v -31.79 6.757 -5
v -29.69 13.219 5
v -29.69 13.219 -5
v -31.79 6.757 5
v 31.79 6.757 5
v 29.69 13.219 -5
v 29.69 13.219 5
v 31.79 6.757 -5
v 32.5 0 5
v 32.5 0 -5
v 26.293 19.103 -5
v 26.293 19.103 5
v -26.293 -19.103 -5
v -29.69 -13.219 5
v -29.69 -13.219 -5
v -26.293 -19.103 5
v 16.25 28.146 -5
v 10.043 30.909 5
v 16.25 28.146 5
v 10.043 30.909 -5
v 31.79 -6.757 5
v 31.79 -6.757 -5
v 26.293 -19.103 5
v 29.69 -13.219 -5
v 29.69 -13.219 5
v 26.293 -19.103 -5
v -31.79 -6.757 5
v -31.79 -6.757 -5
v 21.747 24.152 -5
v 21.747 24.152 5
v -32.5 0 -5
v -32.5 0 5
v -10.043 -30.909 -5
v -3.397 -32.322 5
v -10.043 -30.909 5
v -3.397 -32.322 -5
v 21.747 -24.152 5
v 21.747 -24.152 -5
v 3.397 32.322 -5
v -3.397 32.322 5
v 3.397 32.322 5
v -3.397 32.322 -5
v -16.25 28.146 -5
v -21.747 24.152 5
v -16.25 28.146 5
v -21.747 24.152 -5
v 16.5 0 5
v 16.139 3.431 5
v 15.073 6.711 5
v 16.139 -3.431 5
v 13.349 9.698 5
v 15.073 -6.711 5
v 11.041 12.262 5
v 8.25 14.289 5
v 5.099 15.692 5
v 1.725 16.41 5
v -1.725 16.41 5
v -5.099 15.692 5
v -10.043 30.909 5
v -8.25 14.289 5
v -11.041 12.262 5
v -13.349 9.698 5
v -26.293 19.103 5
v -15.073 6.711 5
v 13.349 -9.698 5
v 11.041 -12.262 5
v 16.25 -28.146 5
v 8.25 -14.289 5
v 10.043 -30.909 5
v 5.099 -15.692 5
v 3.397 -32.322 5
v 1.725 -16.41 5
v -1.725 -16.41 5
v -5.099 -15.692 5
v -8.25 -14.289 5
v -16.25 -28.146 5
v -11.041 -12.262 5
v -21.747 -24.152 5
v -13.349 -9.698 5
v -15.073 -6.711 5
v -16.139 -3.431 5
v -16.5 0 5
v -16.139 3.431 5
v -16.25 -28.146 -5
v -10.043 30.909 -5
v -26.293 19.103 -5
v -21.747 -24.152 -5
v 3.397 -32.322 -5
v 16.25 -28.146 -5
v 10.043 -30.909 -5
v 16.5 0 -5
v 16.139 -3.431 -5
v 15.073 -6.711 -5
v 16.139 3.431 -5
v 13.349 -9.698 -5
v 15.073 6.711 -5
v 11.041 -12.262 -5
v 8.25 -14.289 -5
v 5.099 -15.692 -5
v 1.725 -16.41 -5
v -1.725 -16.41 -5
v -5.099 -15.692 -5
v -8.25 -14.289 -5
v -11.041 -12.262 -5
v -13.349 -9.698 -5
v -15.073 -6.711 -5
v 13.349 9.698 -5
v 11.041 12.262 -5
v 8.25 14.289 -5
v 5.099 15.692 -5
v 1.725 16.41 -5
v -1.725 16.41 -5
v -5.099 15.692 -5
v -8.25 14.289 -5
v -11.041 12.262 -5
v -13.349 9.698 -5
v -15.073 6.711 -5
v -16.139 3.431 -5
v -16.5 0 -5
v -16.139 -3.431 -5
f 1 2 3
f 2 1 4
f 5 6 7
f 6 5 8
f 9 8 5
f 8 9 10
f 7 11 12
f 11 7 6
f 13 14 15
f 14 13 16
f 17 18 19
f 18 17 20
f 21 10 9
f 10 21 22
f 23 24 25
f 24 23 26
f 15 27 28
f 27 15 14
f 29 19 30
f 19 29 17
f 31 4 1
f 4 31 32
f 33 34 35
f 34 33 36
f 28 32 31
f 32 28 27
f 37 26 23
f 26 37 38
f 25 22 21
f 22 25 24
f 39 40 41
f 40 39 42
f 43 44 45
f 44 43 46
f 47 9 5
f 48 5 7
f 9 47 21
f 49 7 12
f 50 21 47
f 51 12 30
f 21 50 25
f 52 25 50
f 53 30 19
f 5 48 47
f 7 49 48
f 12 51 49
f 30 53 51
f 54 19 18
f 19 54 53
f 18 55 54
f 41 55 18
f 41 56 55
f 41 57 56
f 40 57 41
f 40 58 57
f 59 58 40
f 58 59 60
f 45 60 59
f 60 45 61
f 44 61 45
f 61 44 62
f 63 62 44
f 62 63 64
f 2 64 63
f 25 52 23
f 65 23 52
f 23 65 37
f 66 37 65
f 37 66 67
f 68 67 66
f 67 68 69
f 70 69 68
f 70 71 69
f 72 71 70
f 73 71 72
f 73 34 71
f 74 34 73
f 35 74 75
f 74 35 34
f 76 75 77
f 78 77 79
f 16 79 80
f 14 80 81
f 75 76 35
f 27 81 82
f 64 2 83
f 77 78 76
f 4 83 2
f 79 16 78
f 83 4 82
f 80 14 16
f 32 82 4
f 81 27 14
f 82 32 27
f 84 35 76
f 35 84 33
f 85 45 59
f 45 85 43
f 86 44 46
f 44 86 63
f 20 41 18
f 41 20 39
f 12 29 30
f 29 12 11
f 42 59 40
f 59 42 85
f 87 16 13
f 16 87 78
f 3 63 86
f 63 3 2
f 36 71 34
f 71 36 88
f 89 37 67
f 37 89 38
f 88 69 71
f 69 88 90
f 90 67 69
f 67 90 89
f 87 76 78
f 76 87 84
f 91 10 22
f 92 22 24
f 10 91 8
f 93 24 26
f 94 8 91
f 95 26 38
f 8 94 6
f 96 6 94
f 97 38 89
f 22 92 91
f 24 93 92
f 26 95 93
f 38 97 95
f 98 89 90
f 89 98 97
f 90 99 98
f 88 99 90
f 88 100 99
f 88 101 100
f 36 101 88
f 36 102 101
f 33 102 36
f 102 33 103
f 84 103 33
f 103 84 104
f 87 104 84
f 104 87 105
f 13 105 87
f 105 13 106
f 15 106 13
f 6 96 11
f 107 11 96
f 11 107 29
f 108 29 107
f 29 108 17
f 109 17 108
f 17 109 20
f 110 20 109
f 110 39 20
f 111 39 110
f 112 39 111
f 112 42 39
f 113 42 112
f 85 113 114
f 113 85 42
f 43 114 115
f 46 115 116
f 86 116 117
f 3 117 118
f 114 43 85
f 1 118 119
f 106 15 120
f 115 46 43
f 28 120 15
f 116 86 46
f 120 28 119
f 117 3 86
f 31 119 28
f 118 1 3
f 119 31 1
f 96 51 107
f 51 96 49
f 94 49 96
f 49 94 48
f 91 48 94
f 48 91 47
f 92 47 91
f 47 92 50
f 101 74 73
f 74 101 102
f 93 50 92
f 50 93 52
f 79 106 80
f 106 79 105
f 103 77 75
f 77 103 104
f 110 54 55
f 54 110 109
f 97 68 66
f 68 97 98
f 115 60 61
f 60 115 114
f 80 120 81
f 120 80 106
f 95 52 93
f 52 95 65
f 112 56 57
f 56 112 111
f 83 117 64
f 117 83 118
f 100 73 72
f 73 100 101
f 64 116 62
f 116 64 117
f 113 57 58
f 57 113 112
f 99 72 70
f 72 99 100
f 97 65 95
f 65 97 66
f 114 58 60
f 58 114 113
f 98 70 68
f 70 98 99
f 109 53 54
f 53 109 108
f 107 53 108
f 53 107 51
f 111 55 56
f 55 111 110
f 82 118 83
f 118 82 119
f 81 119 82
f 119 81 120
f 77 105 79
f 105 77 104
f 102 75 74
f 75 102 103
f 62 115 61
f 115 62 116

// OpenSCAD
//resolutuion. Minimum angle for a fragment
 $fa=12;
 
// Minimum size of a fragment.
 $fs=2;

// Make either thread or hole
threads = 0; 

// Thread in both ends
both_ends = 0;

// How much space should be added to the hole/threads
thread_tolerance = 0.1;

// Metric tread outer diameter
top_thread_diameter = 8;

// Distance between peaks
top_thread_pitch = 1.25;

// How deep the thread goes
top_thread_depth = 4;

// Metric tread outer diameter
bottom_thread_diameter = 10;

// Distance between peaks
bottom_thread_pitch = 1.5;

// How deep the thread goes
bottom_thread_depth = 4;

// Inner Diameter
id = 33;

// Outer Diameter
od = 65;

//Length of the spacer
length = 10;


difference() {
    //Makes od cylinder
    cylinder(d=od, h=length, center=true);
    
    //Makes id if threads is false
    if  (threads<1)
        cylinder(d=id, h=length + 5, center=true);
    
    else 
        // Makes bottom thread
        translate([0,0,-length / 2])
        metric_thread(top_thread_diameter, top_thread_pitch + thread_tolerance, top_thread_depth, internal=true);
    
        // Makes top thread if needed
        if ((both_ends>0)&&(top_thread_depth+bottom_thread_depth<length))
            translate([0,0,length / 2 - bottom_thread_depth])
        metric_thread(bottom_thread_diameter + thread_tolerance, bottom_thread_pitch, bottom_thread_depth, internal=true);
}



/*
 * ISO-standard metric threads, following this specification:
 *          http://en.wikipedia.org/wiki/ISO_metric_screw_thread
 *
 * Copyright 2020 Dan Kirshner - dan_kirshner@yahoo.com
 * This program is free software: you can redistribute it and/or modify
 * it under the terms of the GNU General Public License as published by
 * the Free Software Foundation, either version 3 of the License, or
 * (at your option) any later version.
 *
 * This program is distributed in the hope that it will be useful,
 * but WITHOUT ANY WARRANTY; without even the implied warranty of
 * MERCHANTABILITY or FITNESS FOR A PARTICULAR PURPOSE.  See the
 * GNU General Public License for more details.
 *
 * See <http://www.gnu.org/licenses/>.
 *
 * Version 2.5.  2020-04-11  Leadin option works for internal threads.
 * Version 2.4.  2019-07-14  Add test option - do not render threads.
 * Version 2.3.  2017-08-31  Default for leadin: 0 (best for internal threads).
 * Version 2.2.  2017-01-01  Correction for angle; leadfac option.  (Thanks to
 *                           Andrew Allen <a2intl@gmail.com>.)
 * Version 2.1.  2016-12-04  Chamfer bottom end (low-z); leadin option.
 * Version 2.0.  2016-11-05  Backwards compatibility (earlier OpenSCAD) fixes.
 * Version 1.9.  2016-07-03  Option: tapered.
 * Version 1.8.  2016-01-08  Option: (non-standard) angle.
 * Version 1.7.  2015-11-28  Larger x-increment - for small-diameters.
 * Version 1.6.  2015-09-01  Options: square threads, rectangular threads.
 * Version 1.5.  2015-06-12  Options: thread_size, groove.
 * Version 1.4.  2014-10-17  Use "faces" instead of "triangles" for polyhedron
 * Version 1.3.  2013-12-01  Correct loop over turns -- don't have early cut-off
 * Version 1.2.  2012-09-09  Use discrete polyhedra rather than linear_extrude ()
 * Version 1.1.  2012-09-07  Corrected to right-hand threads!
 */

// Examples.
//
// Standard M8 x 1.
// metric_thread (diameter=8, pitch=1, length=4);

// Square thread.
// metric_thread (diameter=8, pitch=1, length=4, square=true);

// Non-standard: long pitch, same thread size.
//metric_thread (diameter=8, pitch=4, length=4, thread_size=1, groove=true);

// Non-standard: 20 mm diameter, long pitch, square "trough" width 3 mm,
// depth 1 mm.
//metric_thread (diameter=20, pitch=8, length=16, square=true, thread_size=6,
//               groove=true, rectangle=0.333);

// English: 1/4 x 20.
//english_thread (diameter=1/4, threads_per_inch=20, length=1);

// Tapered.  Example -- pipe size 3/4" -- per:
// http://www.engineeringtoolbox.com/npt-national-pipe-taper-threads-d_750.html
// english_thread (diameter=1.05, threads_per_inch=14, length=3/4, taper=1/16);

// Thread for mounting on Rohloff hub.
//difference () {
//   cylinder (r=20, h=10, $fn=100);
//
//   metric_thread (diameter=34, pitch=1, length=10, internal=true, n_starts=6);
//}


// ----------------------------------------------------------------------------
function segments (diameter) = min (50, max (ceil (diameter*6), 25));


// ----------------------------------------------------------------------------
// diameter -    outside diameter of threads in mm. Default: 8.
// pitch    -    thread axial "travel" per turn in mm.  Default: 1.
// length   -    overall axial length of thread in mm.  Default: 1.
// internal -    true = clearances for internal thread (e.g., a nut).
//               false = clearances for external thread (e.g., a bolt).
//               (Internal threads should be "cut out" from a solid using
//               difference ()).  Default: false.
// n_starts -    Number of thread starts (e.g., DNA, a "double helix," has
//               n_starts=2).  See wikipedia Screw_thread.  Default: 1.
// thread_size - (non-standard) axial width of a single thread "V" - independent
//               of pitch.  Default: same as pitch.
// groove      - (non-standard) true = subtract inverted "V" from cylinder
//                (rather thanadd protruding "V" to cylinder).  Default: false.
// square      - true = square threads (per
//               https://en.wikipedia.org/wiki/Square_thread_form).  Default:
//               false.
// rectangle   - (non-standard) "Rectangular" thread - ratio depth/(axial) width
//               Default: 0 (standard "v" thread).
// angle       - (non-standard) angle (deg) of thread side from perpendicular to
//               axis (default = standard = 30 degrees).
// taper       - diameter change per length (National Pipe Thread/ANSI B1.20.1
//               is 1" diameter per 16" length). Taper decreases from 'diameter'
//               as z increases.  Default: 0 (no taper).
// leadin      - 0 (default): no chamfer; 1: chamfer (45 degree) at max-z end;
//               2: chamfer at both ends, 3: chamfer at z=0 end.
// leadfac     - scale of leadin chamfer length (default: 1.0 = 1/2 thread).
// test        - true = do not render threads (just draw "blank" cylinder).
//               Default: false (draw threads).
module metric_thread (diameter=8, pitch=1, length=1, internal=false, n_starts=1,
                      thread_size=-1, groove=false, square=false, rectangle=0,
                      angle=30, taper=0, leadin=0, leadfac=1.0, test=false)
{
   // thread_size: size of thread "V" different than travel per turn (pitch).
   // Default: same as pitch.
   local_thread_size = thread_size == -1 ? pitch : thread_size;
   local_rectangle = rectangle ? rectangle : 1;

   n_segments = segments (diameter);
   h = (test && ! internal) ? 0 : (square || rectangle) ? local_thread_size*local_rectangle/2 : local_thread_size / (2 * tan(angle));

   h_fac1 = (square || rectangle) ? 0.90 : 0.625;

   // External thread includes additional relief.
   h_fac2 = (square || rectangle) ? 0.95 : 5.3/8;

   tapered_diameter = diameter - length*taper;

   difference () {
      union () {
         if (! groove) {
            if (! test) {
               metric_thread_turns (diameter, pitch, length, internal, n_starts,
                                    local_thread_size, groove, square, rectangle, angle,
                                    taper);
            }
         }

         difference () {

            // Solid center, including Dmin truncation.
            if (groove) {
               cylinder (r1=diameter/2, r2=tapered_diameter/2,
                         h=length, $fn=n_segments);
            } else if (internal) {
               cylinder (r1=diameter/2 - h*h_fac1, r2=tapered_diameter/2 - h*h_fac1,
                         h=length, $fn=n_segments);
            } else {

               // External thread.
               cylinder (r1=diameter/2 - h*h_fac2, r2=tapered_diameter/2 - h*h_fac2,
                         h=length, $fn=n_segments);
            }

            if (groove) {
               if (! test) {
                  metric_thread_turns (diameter, pitch, length, internal, n_starts,
                                       local_thread_size, groove, square, rectangle,
                                       angle, taper);
               }
            }
         }

         // Internal thread lead-in: take away from external solid.
         if (internal) {

            // "Negative chamfer" z=0 end if leadin is 2 or 3.
            if (leadin == 2 || leadin == 3) {
               cylinder (r1=diameter/2, r2=diameter/2 - h*h_fac1*leadfac, h=h*h_fac1*leadfac,
                         $fn=n_segments);
            }

            // "Negative chamfer" z-max end if leadin is 1 or 2.
            if (leadin == 1 || leadin == 2) {
               translate ([0, 0, length + 0.05 - h*h_fac1*leadfac]) {
                  cylinder (r1=tapered_diameter/2 - h*h_fac1*leadfac, h=h*h_fac1*leadfac,
                            r2=tapered_diameter/2,
                            $fn=n_segments);
               }
            }
         }
      }

      if (! internal) {

         // Chamfer z=0 end if leadin is 2 or 3.
         if (leadin == 2 || leadin == 3) {
            difference () {
               cylinder (r=diameter/2 + 1, h=h*h_fac1*leadfac, $fn=n_segments);

               cylinder (r2=diameter/2, r1=diameter/2 - h*h_fac1*leadfac, h=h*h_fac1*leadfac,
                         $fn=n_segments);
            }
         }

         // Chamfer z-max end if leadin is 1 or 2.
         if (leadin == 1 || leadin == 2) {
            translate ([0, 0, length + 0.05 - h*h_fac1*leadfac]) {
               difference () {
                  cylinder (r=diameter/2 + 1, h=h*h_fac1*leadfac, $fn=n_segments);

                  cylinder (r1=tapered_diameter/2, r2=tapered_diameter/2 - h*h_fac1*leadfac, h=h*h_fac1*leadfac,
                            $fn=n_segments);
               }
            }
         }
      }
   }
}


// ----------------------------------------------------------------------------
// Input units in inches.
// Note: units of measure in drawing are mm!
module english_thread (diameter=0.25, threads_per_inch=20, length=1,
                      internal=false, n_starts=1, thread_size=-1, groove=false,
                      square=false, rectangle=0, angle=30, taper=0, leadin=0,
                      leadfac=1.0, test=false)
{
   // Convert to mm.
   mm_diameter = diameter*25.4;
   mm_pitch = (1.0/threads_per_inch)*25.4;
   mm_length = length*25.4;

   echo (str ("mm_diameter: ", mm_diameter));
   echo (str ("mm_pitch: ", mm_pitch));
   echo (str ("mm_length: ", mm_length));
   metric_thread (mm_diameter, mm_pitch, mm_length, internal, n_starts,
                  thread_size, groove, square, rectangle, angle, taper, leadin,
                  leadfac, test);
}

// ----------------------------------------------------------------------------
module metric_thread_turns (diameter, pitch, length, internal, n_starts,
                            thread_size, groove, square, rectangle, angle,
                            taper)
{
   // Number of turns needed.
   n_turns = floor (length/pitch);

   intersection () {

      // Start one below z = 0.  Gives an extra turn at each end.
      for (i=[-1*n_starts : n_turns+1]) {
         translate ([0, 0, i*pitch]) {
            metric_thread_turn (diameter, pitch, internal, n_starts,
                                thread_size, groove, square, rectangle, angle,
                                taper, i*pitch);
         }
      }

      // Cut to length.
      translate ([0, 0, length/2]) {
         cube ([diameter*3, diameter*3, length], center=true);
      }
   }
}


// ----------------------------------------------------------------------------
module metric_thread_turn (diameter, pitch, internal, n_starts, thread_size,
                           groove, square, rectangle, angle, taper, z)
{
   n_segments = segments (diameter);
   fraction_circle = 1.0/n_segments;
   for (i=[0 : n_segments-1]) {
      rotate ([0, 0, i*360*fraction_circle]) {
         translate ([0, 0, i*n_starts*pitch*fraction_circle]) {
            //current_diameter = diameter - taper*(z + i*n_starts*pitch*fraction_circle);
            thread_polyhedron ((diameter - taper*(z + i*n_starts*pitch*fraction_circle))/2,
                               pitch, internal, n_starts, thread_size, groove,
                               square, rectangle, angle);
         }
      }
   }
}


// ----------------------------------------------------------------------------
module thread_polyhedron (radius, pitch, internal, n_starts, thread_size,
                          groove, square, rectangle, angle)
{
   n_segments = segments (radius*2);
   fraction_circle = 1.0/n_segments;

   local_rectangle = rectangle ? rectangle : 1;

   h = (square || rectangle) ? thread_size*local_rectangle/2 : thread_size / (2 * tan(angle));
   outer_r = radius + (internal ? h/20 : 0); // Adds internal relief.
   //echo (str ("outer_r: ", outer_r));

   // A little extra on square thread -- make sure overlaps cylinder.
   h_fac1 = (square || rectangle) ? 1.1 : 0.875;
   inner_r = radius - h*h_fac1; // Does NOT do Dmin_truncation - do later with
                                // cylinder.

   translate_y = groove ? outer_r + inner_r : 0;
   reflect_x   = groove ? 1 : 0;

   // Make these just slightly bigger (keep in proportion) so polyhedra will
   // overlap.
   x_incr_outer = (! groove ? outer_r : inner_r) * fraction_circle * 2 * PI * 1.02;
   x_incr_inner = (! groove ? inner_r : outer_r) * fraction_circle * 2 * PI * 1.02;
   z_incr = n_starts * pitch * fraction_circle * 1.005;

   /*
    (angles x0 and x3 inner are actually 60 deg)

                          /\  (x2_inner, z2_inner) [2]
                         /  \
   (x3_inner, z3_inner) /    \
                  [3]   \     \
                        |\     \ (x2_outer, z2_outer) [6]
                        | \    /
                        |  \  /|
             z          |[7]\/ / (x1_outer, z1_outer) [5]
             |          |   | /
             |   x      |   |/
             |  /       |   / (x0_outer, z0_outer) [4]
             | /        |  /     (behind: (x1_inner, z1_inner) [1]
             |/         | /
    y________|          |/
   (r)                  / (x0_inner, z0_inner) [0]

   */

   x1_outer = outer_r * fraction_circle * 2 * PI;

   z0_outer = (outer_r - inner_r) * tan(angle);
   //echo (str ("z0_outer: ", z0_outer));

   //polygon ([[inner_r, 0], [outer_r, z0_outer],
   //        [outer_r, 0.5*pitch], [inner_r, 0.5*pitch]]);
   z1_outer = z0_outer + z_incr;

   // Give internal square threads some clearance in the z direction, too.
   bottom = internal ? 0.235 : 0.25;
   top    = internal ? 0.765 : 0.75;

   translate ([0, translate_y, 0]) {
      mirror ([reflect_x, 0, 0]) {

         if (square || rectangle) {

            // Rule for face ordering: look at polyhedron from outside: points must
            // be in clockwise order.
            polyhedron (
               points = [
                         [-x_incr_inner/2, -inner_r, bottom*thread_size],         // [0]
                         [x_incr_inner/2, -inner_r, bottom*thread_size + z_incr], // [1]
                         [x_incr_inner/2, -inner_r, top*thread_size + z_incr],    // [2]
                         [-x_incr_inner/2, -inner_r, top*thread_size],            // [3]

                         [-x_incr_outer/2, -outer_r, bottom*thread_size],         // [4]
                         [x_incr_outer/2, -outer_r, bottom*thread_size + z_incr], // [5]
                         [x_incr_outer/2, -outer_r, top*thread_size + z_incr],    // [6]
                         [-x_incr_outer/2, -outer_r, top*thread_size]             // [7]
                        ],

               faces = [
                         [0, 3, 7, 4],  // This-side trapezoid

                         [1, 5, 6, 2],  // Back-side trapezoid

                         [0, 1, 2, 3],  // Inner rectangle

                         [4, 7, 6, 5],  // Outer rectangle

                         // These are not planar, so do with separate triangles.
                         [7, 2, 6],     // Upper rectangle, bottom
                         [7, 3, 2],     // Upper rectangle, top

                         [0, 5, 1],     // Lower rectangle, bottom
                         [0, 4, 5]      // Lower rectangle, top
                        ]
            );
         } else {

            // Rule for face ordering: look at polyhedron from outside: points must
            // be in clockwise order.
            polyhedron (
               points = [
                         [-x_incr_inner/2, -inner_r, 0],                        // [0]
                         [x_incr_inner/2, -inner_r, z_incr],                    // [1]
                         [x_incr_inner/2, -inner_r, thread_size + z_incr],      // [2]
                         [-x_incr_inner/2, -inner_r, thread_size],              // [3]

                         [-x_incr_outer/2, -outer_r, z0_outer],                 // [4]
                         [x_incr_outer/2, -outer_r, z0_outer + z_incr],         // [5]
                         [x_incr_outer/2, -outer_r, thread_size - z0_outer + z_incr], // [6]
                         [-x_incr_outer/2, -outer_r, thread_size - z0_outer]    // [7]
                        ],

               faces = [
                         [0, 3, 7, 4],  // This-side trapezoid

                         [1, 5, 6, 2],  // Back-side trapezoid

                         [0, 1, 2, 3],  // Inner rectangle

                         [4, 7, 6, 5],  // Outer rectangle

                         // These are not planar, so do with separate triangles.
                         [7, 2, 6],     // Upper rectangle, bottom
                         [7, 3, 2],     // Upper rectangle, top

                         [0, 5, 1],     // Lower rectangle, bottom
                         [0, 4, 5]      // Lower rectangle, top
                        ]
            );
         }
      }
   }
}
